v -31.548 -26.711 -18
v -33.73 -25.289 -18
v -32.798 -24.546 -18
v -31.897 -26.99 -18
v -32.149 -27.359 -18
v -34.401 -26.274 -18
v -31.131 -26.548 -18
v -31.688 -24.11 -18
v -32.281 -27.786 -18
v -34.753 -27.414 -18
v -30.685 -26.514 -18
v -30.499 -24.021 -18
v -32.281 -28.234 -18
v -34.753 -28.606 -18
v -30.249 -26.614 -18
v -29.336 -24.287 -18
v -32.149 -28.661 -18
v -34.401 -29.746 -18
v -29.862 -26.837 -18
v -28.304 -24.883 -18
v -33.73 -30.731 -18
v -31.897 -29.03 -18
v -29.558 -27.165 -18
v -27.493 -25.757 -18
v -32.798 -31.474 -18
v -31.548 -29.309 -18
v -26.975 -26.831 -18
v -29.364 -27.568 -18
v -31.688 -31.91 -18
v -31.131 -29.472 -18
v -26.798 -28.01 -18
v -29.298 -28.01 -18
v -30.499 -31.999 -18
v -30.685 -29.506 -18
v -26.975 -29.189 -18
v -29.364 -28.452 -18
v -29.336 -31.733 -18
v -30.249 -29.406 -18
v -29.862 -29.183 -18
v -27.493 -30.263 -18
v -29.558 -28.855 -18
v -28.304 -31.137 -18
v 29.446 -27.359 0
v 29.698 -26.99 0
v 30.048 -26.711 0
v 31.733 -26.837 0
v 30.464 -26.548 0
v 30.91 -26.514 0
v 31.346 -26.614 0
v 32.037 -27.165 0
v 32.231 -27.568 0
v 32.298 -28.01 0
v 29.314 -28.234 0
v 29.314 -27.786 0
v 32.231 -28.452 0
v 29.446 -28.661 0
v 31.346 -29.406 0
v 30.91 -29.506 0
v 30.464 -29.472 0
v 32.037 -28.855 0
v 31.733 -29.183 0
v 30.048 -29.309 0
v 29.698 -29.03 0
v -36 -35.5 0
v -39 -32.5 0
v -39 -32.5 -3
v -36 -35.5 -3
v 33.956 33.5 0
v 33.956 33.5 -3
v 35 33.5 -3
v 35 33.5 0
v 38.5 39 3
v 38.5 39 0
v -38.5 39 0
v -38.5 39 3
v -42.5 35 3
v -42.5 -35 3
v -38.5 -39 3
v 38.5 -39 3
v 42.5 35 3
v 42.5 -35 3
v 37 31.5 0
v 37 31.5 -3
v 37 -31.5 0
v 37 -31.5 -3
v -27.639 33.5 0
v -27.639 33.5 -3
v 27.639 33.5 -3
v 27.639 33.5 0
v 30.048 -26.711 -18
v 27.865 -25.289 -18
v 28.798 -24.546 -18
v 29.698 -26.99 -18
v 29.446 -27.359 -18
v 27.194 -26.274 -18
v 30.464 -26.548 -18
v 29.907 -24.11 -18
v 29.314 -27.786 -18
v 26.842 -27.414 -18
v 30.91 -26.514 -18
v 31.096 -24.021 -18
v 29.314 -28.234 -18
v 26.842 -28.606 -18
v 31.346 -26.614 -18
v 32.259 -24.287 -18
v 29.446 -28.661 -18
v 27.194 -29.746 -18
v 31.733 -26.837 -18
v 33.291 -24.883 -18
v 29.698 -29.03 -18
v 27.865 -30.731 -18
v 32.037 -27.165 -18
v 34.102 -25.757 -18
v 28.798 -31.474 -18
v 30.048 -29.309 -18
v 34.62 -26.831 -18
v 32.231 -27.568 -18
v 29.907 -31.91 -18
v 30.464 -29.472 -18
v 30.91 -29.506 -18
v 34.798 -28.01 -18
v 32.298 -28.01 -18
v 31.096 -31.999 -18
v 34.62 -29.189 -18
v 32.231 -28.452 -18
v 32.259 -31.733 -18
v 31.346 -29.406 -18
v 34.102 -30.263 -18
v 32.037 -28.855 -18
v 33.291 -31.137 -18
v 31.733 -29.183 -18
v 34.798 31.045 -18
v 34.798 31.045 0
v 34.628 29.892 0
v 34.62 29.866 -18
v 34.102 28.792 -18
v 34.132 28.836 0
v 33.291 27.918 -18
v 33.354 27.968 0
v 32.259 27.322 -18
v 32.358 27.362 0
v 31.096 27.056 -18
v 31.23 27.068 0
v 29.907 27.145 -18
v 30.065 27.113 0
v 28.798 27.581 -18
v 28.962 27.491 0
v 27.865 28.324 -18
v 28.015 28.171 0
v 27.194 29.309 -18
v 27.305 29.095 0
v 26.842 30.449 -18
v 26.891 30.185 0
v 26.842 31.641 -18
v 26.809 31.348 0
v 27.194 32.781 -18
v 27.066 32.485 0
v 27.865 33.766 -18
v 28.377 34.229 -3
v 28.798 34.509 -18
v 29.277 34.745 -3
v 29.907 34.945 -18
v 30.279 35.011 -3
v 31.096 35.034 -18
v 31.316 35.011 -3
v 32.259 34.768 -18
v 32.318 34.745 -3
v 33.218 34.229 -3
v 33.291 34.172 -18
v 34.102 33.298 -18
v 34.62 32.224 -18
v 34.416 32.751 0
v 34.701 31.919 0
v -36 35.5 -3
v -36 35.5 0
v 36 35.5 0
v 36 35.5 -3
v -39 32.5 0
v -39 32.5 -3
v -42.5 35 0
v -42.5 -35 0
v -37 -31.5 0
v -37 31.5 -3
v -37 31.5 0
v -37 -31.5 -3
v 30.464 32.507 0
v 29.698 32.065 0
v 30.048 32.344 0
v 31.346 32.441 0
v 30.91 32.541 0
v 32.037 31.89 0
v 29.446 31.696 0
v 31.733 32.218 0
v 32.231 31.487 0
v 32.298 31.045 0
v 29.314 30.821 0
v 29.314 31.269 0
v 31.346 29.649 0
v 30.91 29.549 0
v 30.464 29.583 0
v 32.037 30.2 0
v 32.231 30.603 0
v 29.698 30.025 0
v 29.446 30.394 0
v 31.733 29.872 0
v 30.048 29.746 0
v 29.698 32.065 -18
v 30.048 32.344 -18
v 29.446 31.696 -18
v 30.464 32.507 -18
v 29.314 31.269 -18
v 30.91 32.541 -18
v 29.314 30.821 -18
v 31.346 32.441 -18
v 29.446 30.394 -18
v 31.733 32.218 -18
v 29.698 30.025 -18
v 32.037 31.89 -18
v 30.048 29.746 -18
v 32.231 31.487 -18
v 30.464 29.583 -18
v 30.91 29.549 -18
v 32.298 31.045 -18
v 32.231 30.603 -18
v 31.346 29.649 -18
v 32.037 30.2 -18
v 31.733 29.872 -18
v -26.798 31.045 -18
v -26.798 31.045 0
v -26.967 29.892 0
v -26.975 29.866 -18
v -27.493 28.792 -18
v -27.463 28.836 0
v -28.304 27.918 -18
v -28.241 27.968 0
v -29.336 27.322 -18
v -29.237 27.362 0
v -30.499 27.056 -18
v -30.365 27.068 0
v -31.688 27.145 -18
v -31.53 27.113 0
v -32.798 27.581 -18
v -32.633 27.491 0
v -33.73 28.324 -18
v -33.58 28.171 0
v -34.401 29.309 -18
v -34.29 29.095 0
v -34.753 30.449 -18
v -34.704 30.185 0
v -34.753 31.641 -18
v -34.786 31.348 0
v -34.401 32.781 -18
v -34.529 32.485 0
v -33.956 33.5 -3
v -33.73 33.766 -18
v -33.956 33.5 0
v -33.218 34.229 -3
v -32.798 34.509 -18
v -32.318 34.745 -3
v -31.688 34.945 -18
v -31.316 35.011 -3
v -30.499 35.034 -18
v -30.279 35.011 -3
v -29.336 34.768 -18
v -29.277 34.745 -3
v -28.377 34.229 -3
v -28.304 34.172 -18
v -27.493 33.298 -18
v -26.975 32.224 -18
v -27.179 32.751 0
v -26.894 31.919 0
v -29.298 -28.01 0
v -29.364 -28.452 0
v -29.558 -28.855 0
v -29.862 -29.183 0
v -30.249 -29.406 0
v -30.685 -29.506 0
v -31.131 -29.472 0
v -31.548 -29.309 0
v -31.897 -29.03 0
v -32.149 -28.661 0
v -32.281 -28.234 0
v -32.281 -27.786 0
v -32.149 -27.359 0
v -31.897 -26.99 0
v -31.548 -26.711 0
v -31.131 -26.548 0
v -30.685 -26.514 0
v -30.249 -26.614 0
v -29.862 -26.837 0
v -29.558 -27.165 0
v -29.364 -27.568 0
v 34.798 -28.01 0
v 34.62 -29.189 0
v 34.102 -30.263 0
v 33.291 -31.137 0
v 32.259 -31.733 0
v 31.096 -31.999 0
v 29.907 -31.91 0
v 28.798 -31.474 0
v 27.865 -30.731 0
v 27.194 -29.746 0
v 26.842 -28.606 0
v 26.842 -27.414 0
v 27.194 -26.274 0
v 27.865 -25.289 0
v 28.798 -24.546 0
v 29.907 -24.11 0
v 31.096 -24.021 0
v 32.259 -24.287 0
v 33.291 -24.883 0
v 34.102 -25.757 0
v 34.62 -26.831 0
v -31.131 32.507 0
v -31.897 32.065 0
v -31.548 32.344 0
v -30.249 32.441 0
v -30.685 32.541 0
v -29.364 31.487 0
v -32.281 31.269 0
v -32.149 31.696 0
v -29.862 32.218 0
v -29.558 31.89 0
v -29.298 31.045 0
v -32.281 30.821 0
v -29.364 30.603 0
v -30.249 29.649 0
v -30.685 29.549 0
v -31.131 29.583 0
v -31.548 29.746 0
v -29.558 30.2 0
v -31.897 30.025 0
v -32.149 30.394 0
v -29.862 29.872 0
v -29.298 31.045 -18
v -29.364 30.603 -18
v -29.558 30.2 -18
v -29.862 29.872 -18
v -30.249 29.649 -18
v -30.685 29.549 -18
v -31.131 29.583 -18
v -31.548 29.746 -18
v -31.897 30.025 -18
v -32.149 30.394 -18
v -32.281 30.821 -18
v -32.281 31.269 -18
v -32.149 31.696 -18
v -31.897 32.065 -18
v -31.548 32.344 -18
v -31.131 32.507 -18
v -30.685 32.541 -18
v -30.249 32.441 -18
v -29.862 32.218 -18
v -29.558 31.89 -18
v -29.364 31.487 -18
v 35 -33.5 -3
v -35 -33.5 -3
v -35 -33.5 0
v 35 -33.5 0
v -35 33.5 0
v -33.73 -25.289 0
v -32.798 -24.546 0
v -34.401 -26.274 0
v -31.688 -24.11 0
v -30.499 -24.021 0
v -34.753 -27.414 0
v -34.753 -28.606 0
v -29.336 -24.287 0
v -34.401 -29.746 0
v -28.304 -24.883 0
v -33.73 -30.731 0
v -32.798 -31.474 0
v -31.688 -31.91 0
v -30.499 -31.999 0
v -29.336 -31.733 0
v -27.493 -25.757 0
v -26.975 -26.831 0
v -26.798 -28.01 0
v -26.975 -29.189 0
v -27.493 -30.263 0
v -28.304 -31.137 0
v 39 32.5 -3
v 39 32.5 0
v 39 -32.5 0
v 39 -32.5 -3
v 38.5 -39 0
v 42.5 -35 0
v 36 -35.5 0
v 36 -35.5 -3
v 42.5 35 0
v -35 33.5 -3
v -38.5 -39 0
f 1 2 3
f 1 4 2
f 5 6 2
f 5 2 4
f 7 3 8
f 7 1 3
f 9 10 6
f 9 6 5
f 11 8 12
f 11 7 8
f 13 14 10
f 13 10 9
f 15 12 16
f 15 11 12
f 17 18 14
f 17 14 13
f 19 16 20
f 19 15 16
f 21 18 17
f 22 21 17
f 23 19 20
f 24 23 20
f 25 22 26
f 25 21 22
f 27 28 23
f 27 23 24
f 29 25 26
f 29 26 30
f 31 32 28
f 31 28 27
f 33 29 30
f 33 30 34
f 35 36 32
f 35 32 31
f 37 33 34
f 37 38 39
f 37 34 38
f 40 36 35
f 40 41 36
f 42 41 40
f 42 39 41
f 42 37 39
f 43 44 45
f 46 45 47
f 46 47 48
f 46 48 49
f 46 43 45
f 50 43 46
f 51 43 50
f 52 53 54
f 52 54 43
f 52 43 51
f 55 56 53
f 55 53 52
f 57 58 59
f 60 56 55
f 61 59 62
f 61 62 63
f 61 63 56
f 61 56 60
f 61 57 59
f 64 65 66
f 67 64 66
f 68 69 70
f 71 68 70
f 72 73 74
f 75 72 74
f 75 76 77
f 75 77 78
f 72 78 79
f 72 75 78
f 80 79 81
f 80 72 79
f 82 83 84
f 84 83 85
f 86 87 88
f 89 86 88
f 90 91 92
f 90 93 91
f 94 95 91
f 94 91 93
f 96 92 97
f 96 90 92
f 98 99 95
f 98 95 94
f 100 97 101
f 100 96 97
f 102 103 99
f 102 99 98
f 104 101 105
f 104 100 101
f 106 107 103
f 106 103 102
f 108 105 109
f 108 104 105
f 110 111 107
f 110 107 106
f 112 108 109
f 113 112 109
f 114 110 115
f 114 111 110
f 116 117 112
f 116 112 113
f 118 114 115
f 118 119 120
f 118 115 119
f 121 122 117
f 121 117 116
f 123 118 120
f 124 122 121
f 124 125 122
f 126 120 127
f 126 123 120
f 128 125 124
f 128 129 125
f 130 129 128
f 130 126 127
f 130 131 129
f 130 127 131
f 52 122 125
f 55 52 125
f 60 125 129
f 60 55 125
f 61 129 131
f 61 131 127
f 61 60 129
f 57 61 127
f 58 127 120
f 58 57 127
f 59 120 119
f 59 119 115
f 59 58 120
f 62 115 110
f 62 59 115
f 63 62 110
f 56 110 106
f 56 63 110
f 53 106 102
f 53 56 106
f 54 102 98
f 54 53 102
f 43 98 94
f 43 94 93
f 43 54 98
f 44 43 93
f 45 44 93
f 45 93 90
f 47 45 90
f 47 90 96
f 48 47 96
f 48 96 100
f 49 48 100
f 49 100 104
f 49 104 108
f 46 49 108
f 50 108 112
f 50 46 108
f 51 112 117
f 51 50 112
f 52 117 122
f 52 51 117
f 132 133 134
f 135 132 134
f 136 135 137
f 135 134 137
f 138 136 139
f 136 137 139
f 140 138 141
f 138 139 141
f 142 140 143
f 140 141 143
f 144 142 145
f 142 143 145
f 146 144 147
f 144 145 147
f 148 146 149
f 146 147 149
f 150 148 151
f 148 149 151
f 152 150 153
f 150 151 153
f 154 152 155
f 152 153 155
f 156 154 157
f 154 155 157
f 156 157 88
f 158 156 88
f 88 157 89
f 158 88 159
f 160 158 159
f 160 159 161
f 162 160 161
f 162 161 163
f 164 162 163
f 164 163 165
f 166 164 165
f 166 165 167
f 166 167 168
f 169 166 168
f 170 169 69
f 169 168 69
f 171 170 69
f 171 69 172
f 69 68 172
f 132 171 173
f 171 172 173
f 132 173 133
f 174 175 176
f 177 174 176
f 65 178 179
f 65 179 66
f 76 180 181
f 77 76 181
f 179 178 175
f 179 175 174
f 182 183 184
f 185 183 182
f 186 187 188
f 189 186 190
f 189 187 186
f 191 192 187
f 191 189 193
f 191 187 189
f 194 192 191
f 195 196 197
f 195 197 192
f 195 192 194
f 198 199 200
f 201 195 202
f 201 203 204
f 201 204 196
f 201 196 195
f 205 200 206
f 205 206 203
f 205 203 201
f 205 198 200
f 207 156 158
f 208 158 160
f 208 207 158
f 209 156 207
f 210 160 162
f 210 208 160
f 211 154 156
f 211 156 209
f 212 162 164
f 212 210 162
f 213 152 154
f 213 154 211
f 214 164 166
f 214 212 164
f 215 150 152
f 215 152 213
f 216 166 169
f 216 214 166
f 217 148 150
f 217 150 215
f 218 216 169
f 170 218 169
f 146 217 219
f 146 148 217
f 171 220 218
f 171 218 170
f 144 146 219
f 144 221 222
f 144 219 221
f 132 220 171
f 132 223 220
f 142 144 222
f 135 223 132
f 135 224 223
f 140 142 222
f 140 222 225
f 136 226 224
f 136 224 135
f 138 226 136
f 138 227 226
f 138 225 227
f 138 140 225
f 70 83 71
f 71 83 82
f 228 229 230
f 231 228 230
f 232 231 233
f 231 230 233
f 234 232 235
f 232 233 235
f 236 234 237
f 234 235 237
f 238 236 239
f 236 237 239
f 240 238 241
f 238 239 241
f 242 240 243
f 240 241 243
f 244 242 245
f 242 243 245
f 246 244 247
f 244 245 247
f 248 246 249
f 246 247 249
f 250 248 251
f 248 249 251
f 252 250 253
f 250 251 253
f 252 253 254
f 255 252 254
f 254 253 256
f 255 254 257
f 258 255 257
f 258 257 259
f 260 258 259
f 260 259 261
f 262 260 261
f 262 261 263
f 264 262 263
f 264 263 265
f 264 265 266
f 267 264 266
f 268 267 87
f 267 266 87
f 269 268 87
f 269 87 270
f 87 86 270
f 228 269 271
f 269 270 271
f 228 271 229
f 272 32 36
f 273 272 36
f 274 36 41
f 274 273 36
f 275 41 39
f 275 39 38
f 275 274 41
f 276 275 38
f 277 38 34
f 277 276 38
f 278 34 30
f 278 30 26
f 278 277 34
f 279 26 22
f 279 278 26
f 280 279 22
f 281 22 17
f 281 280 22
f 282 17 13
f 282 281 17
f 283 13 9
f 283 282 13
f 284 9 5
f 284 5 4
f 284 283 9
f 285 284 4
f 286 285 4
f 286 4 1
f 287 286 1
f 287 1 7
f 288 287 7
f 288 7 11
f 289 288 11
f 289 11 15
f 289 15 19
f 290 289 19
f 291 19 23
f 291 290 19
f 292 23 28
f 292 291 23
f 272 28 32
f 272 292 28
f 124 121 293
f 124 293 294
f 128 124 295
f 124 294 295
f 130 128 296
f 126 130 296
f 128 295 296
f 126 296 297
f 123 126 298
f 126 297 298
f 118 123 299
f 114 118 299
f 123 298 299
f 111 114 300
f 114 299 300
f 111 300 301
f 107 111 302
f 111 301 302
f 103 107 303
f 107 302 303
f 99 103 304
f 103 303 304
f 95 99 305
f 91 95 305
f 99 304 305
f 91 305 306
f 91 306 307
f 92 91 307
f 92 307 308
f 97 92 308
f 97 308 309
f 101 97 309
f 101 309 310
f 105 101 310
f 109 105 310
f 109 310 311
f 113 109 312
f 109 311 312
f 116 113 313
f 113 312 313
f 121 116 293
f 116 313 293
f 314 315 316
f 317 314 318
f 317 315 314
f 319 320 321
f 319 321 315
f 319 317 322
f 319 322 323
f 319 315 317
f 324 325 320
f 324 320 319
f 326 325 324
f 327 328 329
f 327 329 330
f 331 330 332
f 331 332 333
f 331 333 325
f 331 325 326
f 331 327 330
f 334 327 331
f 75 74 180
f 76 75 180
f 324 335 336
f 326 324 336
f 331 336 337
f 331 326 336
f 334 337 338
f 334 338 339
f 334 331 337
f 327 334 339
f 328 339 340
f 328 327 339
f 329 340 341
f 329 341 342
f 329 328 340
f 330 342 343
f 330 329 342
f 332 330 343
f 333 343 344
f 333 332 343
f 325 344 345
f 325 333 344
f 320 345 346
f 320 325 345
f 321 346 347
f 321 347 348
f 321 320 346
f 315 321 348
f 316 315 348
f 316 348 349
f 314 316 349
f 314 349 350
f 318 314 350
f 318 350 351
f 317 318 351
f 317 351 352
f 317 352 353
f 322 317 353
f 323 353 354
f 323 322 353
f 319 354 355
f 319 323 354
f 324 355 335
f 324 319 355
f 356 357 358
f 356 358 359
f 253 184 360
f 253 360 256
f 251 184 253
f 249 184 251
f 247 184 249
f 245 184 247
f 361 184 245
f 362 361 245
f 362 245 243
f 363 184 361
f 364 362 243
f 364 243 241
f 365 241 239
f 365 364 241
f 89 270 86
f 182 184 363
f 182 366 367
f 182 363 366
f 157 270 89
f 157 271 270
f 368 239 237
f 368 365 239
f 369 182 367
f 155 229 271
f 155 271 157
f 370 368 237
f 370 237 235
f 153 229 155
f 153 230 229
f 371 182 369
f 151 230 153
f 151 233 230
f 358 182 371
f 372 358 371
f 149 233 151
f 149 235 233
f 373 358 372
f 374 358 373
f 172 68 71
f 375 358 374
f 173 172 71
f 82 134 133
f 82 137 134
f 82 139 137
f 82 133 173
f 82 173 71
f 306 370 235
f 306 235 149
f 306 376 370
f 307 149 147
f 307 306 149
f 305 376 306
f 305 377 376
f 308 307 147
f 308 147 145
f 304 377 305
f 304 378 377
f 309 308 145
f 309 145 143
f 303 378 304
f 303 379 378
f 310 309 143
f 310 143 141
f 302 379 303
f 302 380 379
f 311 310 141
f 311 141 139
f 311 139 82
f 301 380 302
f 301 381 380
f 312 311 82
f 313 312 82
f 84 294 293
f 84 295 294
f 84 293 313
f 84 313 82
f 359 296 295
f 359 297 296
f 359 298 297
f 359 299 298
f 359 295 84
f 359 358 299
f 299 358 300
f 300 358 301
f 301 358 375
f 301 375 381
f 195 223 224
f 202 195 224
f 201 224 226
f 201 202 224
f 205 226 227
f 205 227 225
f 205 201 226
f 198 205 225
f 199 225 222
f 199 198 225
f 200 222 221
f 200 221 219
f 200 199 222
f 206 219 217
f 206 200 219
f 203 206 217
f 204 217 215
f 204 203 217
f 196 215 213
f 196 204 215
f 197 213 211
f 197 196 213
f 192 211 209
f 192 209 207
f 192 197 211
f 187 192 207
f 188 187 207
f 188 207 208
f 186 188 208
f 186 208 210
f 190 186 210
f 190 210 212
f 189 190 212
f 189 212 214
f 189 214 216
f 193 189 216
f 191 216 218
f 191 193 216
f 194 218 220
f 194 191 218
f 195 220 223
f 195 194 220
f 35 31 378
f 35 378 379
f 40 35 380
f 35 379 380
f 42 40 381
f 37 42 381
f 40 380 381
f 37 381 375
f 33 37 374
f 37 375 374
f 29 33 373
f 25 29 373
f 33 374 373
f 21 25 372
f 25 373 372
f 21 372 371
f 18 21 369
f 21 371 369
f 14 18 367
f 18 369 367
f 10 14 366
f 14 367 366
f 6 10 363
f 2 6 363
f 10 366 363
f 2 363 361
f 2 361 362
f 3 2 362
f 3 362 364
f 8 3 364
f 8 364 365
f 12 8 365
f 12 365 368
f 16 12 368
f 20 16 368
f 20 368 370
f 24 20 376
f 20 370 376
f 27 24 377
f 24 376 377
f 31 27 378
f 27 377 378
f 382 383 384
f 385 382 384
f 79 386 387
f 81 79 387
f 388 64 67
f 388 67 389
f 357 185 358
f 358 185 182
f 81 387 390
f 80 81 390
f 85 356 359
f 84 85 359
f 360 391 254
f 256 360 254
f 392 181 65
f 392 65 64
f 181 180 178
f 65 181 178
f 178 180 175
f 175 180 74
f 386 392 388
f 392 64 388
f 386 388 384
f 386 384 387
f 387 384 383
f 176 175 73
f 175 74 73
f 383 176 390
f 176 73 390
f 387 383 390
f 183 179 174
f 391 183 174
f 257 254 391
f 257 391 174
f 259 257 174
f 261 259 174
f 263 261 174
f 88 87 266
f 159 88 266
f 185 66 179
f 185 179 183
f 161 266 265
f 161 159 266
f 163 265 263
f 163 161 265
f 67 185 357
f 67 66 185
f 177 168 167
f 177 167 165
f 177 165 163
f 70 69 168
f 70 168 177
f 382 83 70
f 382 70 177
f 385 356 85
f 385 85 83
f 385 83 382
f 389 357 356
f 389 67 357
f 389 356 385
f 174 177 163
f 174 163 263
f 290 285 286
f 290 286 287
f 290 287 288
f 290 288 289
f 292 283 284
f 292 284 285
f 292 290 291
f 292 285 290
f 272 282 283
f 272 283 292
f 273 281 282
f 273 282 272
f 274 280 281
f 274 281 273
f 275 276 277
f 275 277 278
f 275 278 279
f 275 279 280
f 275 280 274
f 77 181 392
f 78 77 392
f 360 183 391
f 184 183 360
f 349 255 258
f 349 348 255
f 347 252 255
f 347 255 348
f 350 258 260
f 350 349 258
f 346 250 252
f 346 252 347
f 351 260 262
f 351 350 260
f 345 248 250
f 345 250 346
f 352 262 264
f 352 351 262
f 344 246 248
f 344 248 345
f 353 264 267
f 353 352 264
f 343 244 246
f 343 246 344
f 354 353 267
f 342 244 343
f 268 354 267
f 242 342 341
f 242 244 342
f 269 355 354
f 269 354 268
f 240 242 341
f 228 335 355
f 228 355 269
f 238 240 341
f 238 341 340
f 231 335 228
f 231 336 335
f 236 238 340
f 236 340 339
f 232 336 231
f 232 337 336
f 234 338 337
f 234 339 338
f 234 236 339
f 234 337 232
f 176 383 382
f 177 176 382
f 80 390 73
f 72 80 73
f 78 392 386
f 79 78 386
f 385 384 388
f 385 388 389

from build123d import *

# Parameters (mm, degrees)
PAD_DEPTH       = 3
SKETCH001_W     = 78
SKETCH001_H     = 71
PAD001_DEPTH    = 3
CHAMFER_SIZE    = 3
SKETCH002_W     = 74
SKETCH002_H     = 67
POCKET_DEPTH    = 3
CHAMFER001_SIZE = 2
SKETCH003_R     = 4
SKETCH003_R_2   = 1.5
PAD002_DEPTH    = 18


with BuildPart() as part:
    # Sketch → Pad (new body)
    with BuildSketch(Plane.XY):
        Polygon((38.5, 39), (-38.5, 39), (-42.5, 35), (-42.5, -35), (-38.5, -39), (38.5, -39), (42.5, -35), (42.5, 35), align=None)
    extrude(amount=PAD_DEPTH)

    # Sketch001 (on Face9 of Pad) → Pad001 (join)
    with BuildSketch(Plane(origin=(0, 0, 0), x_dir=(1, 0, 0), z_dir=(0, 0, -1))):
        Rectangle(SKETCH001_W, SKETCH001_H)
    extrude(amount=PAD001_DEPTH)

    # Chamfer
    chamfer_edges = [part.edges().sort_by_distance(p)[0] for p in [
        (39, 35.5, -1.5),
        (-39, 35.5, -1.5),
        (-39, -35.5, -1.5),
        (39, -35.5, -1.5),
    ]]
    chamfer(chamfer_edges, length=CHAMFER_SIZE)

    # Sketch002 (on Face18 of Chamfer) → Pocket (cut)
    with BuildSketch(Plane(origin=(0, 0, -3), x_dir=(1, 0, 0), z_dir=(0, 0, -1))):
        Rectangle(SKETCH002_W, SKETCH002_H)
    extrude(amount=-POCKET_DEPTH, mode=Mode.SUBTRACT)

    # Chamfer001
    chamfer001_edges = [part.edges().sort_by_distance(p)[0] for p in [
        (37, 33.5, -1.5),
        (-37, 33.5, -1.5),
        (-37, -33.5, -1.5),
        (37, -33.5, -1.5),
    ]]
    chamfer(chamfer001_edges, length=CHAMFER001_SIZE)

    # Sketch003 (on Face18 of Chamfer001) → Pad002 (join)
    with BuildSketch(Plane(origin=(0, 0, 0), x_dir=(1, 0, 0), z_dir=(0, 0, -1))):
        with Locations((-30.7975, 28.01)):
            Circle(SKETCH003_R)
        with Locations((-30.7975, 28.01)):
            Circle(SKETCH003_R_2, mode=Mode.SUBTRACT)
        with Locations((30.7975, 28.01)):
            Circle(SKETCH003_R)
        with Locations((30.7975, 28.01)):
            Circle(SKETCH003_R_2, mode=Mode.SUBTRACT)
        with Locations((-30.7975, -31.045)):
            Circle(SKETCH003_R)
        with Locations((-30.7975, -31.045)):
            Circle(SKETCH003_R_2, mode=Mode.SUBTRACT)
        with Locations((30.7975, -31.045)):
            Circle(SKETCH003_R)
        with Locations((30.7975, -31.045)):
            Circle(SKETCH003_R_2, mode=Mode.SUBTRACT)
    extrude(amount=PAD002_DEPTH)


solid = part.part
